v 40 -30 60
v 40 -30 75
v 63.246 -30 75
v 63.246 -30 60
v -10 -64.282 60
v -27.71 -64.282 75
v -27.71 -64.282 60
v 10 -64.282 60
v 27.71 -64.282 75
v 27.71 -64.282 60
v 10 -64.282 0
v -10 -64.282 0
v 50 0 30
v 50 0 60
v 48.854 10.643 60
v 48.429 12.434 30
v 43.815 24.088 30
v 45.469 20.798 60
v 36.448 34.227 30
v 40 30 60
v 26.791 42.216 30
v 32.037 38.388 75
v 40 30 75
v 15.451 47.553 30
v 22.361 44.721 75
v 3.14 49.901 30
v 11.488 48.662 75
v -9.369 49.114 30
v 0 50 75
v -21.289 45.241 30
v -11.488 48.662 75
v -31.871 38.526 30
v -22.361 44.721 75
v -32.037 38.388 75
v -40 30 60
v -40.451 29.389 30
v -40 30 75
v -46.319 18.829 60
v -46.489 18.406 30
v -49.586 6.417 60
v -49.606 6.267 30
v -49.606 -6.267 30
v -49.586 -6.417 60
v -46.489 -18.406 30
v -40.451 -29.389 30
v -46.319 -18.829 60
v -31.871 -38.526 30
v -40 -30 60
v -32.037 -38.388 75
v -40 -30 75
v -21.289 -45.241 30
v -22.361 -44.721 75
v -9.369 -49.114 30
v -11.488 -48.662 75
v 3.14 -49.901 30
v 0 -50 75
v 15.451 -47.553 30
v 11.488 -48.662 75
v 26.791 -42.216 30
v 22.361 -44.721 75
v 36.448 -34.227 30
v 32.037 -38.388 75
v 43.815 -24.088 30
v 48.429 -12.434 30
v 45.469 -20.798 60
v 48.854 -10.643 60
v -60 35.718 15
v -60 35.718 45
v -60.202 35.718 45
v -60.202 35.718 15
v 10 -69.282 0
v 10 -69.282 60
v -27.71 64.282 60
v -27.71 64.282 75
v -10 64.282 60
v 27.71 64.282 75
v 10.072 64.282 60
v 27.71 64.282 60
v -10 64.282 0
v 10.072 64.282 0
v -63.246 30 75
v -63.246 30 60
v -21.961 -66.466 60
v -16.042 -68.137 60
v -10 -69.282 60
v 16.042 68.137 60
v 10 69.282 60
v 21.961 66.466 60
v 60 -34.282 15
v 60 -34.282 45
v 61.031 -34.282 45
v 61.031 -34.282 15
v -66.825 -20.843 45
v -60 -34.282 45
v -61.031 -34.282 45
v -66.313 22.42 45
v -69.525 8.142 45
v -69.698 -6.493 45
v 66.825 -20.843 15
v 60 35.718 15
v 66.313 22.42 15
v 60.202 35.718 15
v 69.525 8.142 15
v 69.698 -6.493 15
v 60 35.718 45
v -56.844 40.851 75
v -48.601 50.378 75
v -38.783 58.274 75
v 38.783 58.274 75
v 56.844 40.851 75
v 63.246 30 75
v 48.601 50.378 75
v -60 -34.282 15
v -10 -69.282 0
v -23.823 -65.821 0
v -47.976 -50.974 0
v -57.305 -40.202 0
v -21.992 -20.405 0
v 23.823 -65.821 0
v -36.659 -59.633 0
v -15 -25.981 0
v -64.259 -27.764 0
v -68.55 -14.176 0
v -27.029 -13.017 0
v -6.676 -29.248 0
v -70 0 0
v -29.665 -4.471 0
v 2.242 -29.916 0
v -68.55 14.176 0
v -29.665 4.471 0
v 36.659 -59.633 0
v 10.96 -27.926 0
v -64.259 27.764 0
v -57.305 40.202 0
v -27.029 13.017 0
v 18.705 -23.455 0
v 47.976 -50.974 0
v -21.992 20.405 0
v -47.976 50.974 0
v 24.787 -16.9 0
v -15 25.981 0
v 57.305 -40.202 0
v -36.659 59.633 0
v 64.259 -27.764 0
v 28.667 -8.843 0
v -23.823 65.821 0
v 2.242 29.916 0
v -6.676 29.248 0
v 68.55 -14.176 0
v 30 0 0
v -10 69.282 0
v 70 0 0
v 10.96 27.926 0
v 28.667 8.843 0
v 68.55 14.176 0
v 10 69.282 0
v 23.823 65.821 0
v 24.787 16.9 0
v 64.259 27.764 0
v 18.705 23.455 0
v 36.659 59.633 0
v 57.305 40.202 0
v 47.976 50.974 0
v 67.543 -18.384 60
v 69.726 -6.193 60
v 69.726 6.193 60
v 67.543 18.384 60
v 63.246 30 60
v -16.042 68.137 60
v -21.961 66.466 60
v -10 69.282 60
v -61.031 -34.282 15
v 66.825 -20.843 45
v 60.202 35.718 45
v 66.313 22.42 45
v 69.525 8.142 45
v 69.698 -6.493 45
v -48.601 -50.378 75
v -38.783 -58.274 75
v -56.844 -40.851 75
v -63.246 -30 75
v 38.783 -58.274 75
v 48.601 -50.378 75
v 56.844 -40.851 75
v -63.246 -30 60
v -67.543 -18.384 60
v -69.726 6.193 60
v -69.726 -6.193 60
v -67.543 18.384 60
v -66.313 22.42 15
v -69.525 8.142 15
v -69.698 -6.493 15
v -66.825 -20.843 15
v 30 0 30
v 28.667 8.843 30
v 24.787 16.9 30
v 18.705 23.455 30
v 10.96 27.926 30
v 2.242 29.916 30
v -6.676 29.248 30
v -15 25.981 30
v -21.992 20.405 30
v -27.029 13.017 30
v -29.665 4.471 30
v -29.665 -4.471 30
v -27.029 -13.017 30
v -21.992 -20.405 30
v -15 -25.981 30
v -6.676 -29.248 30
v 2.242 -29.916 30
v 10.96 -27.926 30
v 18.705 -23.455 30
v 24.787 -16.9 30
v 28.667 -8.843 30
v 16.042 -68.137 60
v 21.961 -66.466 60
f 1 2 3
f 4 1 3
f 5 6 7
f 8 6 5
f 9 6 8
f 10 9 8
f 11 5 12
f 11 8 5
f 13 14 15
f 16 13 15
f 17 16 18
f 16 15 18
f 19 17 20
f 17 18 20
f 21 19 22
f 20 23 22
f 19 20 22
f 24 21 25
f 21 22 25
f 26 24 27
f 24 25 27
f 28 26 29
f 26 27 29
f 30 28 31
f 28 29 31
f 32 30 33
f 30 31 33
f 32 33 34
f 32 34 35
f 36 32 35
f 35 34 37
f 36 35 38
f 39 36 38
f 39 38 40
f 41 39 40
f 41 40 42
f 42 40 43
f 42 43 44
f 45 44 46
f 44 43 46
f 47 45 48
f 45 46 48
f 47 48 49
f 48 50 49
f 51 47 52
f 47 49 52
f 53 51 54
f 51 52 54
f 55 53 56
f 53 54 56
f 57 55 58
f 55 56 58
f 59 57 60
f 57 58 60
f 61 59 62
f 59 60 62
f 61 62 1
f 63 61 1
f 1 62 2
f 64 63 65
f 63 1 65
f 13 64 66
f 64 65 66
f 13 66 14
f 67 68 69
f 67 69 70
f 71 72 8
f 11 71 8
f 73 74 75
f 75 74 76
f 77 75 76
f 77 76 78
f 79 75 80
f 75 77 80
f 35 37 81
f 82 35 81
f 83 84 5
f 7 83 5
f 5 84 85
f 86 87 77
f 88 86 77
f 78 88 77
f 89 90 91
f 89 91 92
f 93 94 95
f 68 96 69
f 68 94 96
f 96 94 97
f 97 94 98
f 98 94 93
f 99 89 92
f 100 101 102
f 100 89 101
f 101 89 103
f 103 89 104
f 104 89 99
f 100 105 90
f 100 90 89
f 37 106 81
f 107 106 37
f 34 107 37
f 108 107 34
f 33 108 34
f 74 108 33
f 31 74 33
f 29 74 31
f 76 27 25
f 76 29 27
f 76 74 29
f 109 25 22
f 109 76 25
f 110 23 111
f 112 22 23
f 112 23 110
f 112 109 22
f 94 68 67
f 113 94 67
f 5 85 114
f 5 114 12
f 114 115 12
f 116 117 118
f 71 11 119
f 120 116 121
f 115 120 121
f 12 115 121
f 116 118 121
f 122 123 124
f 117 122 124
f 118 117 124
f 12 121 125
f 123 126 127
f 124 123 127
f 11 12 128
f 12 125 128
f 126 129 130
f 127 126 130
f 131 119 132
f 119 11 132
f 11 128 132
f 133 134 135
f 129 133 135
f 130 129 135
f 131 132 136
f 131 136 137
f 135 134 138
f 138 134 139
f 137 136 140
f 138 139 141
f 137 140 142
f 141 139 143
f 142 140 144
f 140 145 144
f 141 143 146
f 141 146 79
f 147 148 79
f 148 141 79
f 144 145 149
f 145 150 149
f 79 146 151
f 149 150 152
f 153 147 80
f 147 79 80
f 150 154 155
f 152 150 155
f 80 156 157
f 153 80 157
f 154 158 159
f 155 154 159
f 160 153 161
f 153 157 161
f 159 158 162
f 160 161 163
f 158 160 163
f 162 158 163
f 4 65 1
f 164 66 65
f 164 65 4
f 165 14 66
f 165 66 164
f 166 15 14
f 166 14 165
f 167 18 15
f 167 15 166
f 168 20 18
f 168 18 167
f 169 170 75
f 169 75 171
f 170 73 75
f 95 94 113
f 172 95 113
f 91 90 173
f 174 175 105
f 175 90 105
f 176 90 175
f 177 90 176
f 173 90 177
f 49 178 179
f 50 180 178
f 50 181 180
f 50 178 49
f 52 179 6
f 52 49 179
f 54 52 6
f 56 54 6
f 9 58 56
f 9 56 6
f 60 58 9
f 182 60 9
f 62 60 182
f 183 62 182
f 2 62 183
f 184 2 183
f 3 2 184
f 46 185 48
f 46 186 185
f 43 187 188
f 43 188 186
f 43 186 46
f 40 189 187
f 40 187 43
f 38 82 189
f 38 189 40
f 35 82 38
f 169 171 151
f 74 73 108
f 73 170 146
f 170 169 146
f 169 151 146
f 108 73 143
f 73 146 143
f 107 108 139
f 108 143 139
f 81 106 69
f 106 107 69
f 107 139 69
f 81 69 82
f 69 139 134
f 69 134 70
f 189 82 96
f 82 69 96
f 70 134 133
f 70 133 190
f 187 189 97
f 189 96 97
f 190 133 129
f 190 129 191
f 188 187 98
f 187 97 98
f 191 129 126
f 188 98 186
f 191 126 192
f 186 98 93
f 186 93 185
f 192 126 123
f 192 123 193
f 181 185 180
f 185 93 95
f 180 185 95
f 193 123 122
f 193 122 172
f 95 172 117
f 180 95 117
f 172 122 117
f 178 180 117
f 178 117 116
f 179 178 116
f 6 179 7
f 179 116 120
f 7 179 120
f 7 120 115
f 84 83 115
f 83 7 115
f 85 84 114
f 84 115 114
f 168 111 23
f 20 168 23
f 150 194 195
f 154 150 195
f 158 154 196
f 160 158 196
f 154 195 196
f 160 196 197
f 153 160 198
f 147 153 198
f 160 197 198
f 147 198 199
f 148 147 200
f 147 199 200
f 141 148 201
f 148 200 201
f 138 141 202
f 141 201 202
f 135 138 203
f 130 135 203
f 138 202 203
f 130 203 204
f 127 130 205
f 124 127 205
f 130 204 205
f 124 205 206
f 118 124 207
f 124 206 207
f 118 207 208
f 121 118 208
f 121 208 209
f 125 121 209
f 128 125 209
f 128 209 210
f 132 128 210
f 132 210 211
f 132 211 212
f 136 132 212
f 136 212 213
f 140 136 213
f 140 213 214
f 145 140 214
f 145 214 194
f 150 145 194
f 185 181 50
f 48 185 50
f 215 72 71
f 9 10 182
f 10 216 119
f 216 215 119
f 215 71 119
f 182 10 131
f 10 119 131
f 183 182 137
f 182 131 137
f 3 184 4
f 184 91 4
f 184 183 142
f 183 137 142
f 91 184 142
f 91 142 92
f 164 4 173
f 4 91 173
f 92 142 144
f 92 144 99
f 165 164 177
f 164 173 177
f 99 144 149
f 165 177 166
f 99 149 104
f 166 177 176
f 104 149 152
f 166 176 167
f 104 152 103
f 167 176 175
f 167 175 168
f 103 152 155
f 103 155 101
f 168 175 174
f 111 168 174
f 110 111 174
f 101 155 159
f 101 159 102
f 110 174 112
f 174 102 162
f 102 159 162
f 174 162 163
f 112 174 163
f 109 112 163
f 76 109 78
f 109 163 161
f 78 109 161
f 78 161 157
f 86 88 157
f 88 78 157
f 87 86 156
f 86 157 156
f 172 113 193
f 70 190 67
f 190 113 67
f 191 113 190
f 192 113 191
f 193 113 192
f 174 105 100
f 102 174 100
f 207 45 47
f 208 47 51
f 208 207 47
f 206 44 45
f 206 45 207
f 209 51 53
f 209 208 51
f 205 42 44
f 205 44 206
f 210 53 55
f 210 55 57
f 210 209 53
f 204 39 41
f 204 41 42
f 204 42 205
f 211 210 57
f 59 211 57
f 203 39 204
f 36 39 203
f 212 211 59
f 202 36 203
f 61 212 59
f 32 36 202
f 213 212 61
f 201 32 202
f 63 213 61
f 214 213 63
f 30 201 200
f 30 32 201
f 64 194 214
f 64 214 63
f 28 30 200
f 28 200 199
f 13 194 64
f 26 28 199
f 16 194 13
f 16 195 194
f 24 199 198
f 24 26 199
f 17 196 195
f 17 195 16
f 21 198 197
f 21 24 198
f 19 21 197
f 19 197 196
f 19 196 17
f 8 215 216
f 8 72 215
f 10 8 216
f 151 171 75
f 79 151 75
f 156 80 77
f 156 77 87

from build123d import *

# Parameters (mm, degrees)
SKETCH1_R           = 70
BOSS_EXTRUDE1_DEPTH = 75
SKETCH2_R           = 30
CUT_EXTRUDE1_DEPTH  = 75
CUT_EXTRUDE2_DEPTH  = 75
CUT_EXTRUDE3_DEPTH  = 75
SKETCH5_W           = 30
SKETCH5_H           = 70
CUT_EXTRUDE5_DEPTH  = 75
SKETCH6_W           = 30
SKETCH6_H           = 70
CUT_EXTRUDE6_DEPTH  = 75
SKETCH7_W           = 50
SKETCH7_H           = 15
CUT_EXTRUDE11_DEPTH = 5
CUT_EXTRUDE12_DEPTH = 88
SKETCH12_W          = 15
SKETCH12_H          = 1.10145185
CUT_EXTRUDE14_DEPTH = 88
SKETCH13_W          = 15
SKETCH13_H          = 1.10145185
CUT_EXTRUDE15_DEPTH = 88
SKETCH14_W          = 50
SKETCH14_H          = 15
CUT_EXTRUDE16_DEPTH = 5
SKETCH15_W          = 20
SKETCH15_H          = 5
CUT_EXTRUDE17_DEPTH = 73
SKETCH16_W          = 15
SKETCH16_H          = 1.10145185
CUT_EXTRUDE18_DEPTH = 73
SKETCH17_W          = 15
SKETCH17_H          = 1.10145185
CUT_EXTRUDE19_DEPTH = 73
CUT_EXTRUDE20_DEPTH = 15
SKETCH20_R          = 50
CUT_EXTRUDE21_DEPTH = 45


with BuildPart() as part:
    # Sketch1 → Boss-Extrude1 (new body)
    with BuildSketch(Plane.XY):
        Circle(SKETCH1_R)
    extrude(amount=BOSS_EXTRUDE1_DEPTH)

    # Sketch2 → Cut-Extrude1 (cut)
    with BuildSketch(Plane.XY.offset(75)):
        Circle(SKETCH2_R)
    extrude(amount=-CUT_EXTRUDE1_DEPTH, mode=Mode.SUBTRACT)

    # Sketch3 → Cut-Extrude2 (cut)
    with BuildSketch(Plane.XY.offset(75)):
        with BuildLine():
            Line((-10, 69.282032303), (10, 69.282032303))
            ThreePointArc((10, 69.282032303), (0, 70), (-10, 69.282032303))
        make_face()
    extrude(amount=-CUT_EXTRUDE2_DEPTH, mode=Mode.SUBTRACT)

    # Sketch4 → Cut-Extrude3 (cut)
    with BuildSketch(Plane.XY.offset(75)):
        with BuildLine():
            ThreePointArc((-10, -69.282032303), (0, -70), (10, -69.282032303))
            Line((10, -69.282032303), (-10, -69.282032303))
        make_face()
    extrude(amount=-CUT_EXTRUDE3_DEPTH, mode=Mode.SUBTRACT)

    # Sketch5 → Cut-Extrude5 (cut)
    with BuildSketch(Plane(origin=(-60, 0, 0), x_dir=(0, 0, -1), z_dir=(1, 0, 0))):
        with Locations((-30, 0.717967697)):
            Rectangle(SKETCH5_W, SKETCH5_H)
    extrude(amount=-CUT_EXTRUDE5_DEPTH, mode=Mode.SUBTRACT)

    # Sketch6 → Cut-Extrude6 (cut)
    with BuildSketch(Plane(origin=(60, 0, 0), x_dir=(0, 0, -1), z_dir=(1, 0, 0))):
        with Locations((-30, 0.717967697)):
            Rectangle(SKETCH6_W, SKETCH6_H)
    extrude(amount=CUT_EXTRUDE6_DEPTH, mode=Mode.SUBTRACT)

    # Sketch7 → Cut-Extrude11 (cut)
    with BuildSketch(Plane(origin=(0, 69.282032303, 0), x_dir=(1, 0, 0), z_dir=(0, 1, 0))):
        with Locations((0, -67.5)):
            Rectangle(SKETCH7_W, SKETCH7_H)
    extrude(amount=-CUT_EXTRUDE11_DEPTH, mode=Mode.SUBTRACT)

    # Sketch10 → Cut-Extrude12 (cut)
    with BuildSketch(Plane.XY.offset(60)):
        Polygon((-10, 69.282032303), (-10, 64.282032303), (10.07167941, 64.282032303), (10, 69.282032303), align=None)
    extrude(amount=-CUT_EXTRUDE12_DEPTH, mode=Mode.SUBTRACT)

    # Sketch12 → Cut-Extrude14 (cut)
    with BuildSketch(Plane(origin=(-25, 0, 0), x_dir=(0, 0, -1), z_dir=(1, 0, 0))):
        with Locations((-67.5, 64.832758228)):
            Rectangle(SKETCH12_W, SKETCH12_H)
    extrude(amount=-CUT_EXTRUDE14_DEPTH, mode=Mode.SUBTRACT)

    # Sketch13 → Cut-Extrude15 (cut)
    with BuildSketch(Plane.ZY.offset(-25)):
        with Locations((67.5, 64.832758228)):
            Rectangle(SKETCH13_W, SKETCH13_H)
    extrude(amount=-CUT_EXTRUDE15_DEPTH, mode=Mode.SUBTRACT)

    # Sketch14 → Cut-Extrude16 (cut)
    with BuildSketch(Plane.XZ.offset(69.282032303)):
        with Locations((0, 67.5)):
            Rectangle(SKETCH14_W, SKETCH14_H)
    extrude(amount=-CUT_EXTRUDE16_DEPTH, mode=Mode.SUBTRACT)

    # Sketch15 → Cut-Extrude17 (cut)
    with BuildSketch(Plane.XY.offset(60)):
        with Locations((0, -66.782032303)):
            Rectangle(SKETCH15_W, SKETCH15_H)
    extrude(amount=-CUT_EXTRUDE17_DEPTH, mode=Mode.SUBTRACT)

    # Sketch16 → Cut-Extrude18 (cut)
    with BuildSketch(Plane.ZY.offset(-25)):
        with Locations((67.5, -64.832758228)):
            Rectangle(SKETCH16_W, SKETCH16_H)
    extrude(amount=-CUT_EXTRUDE18_DEPTH, mode=Mode.SUBTRACT)

    # Sketch17 → Cut-Extrude19 (cut)
    with BuildSketch(Plane(origin=(-25, 0, 0), x_dir=(0, 0, -1), z_dir=(1, 0, 0))):
        with Locations((-67.5, -64.832758228)):
            Rectangle(SKETCH17_W, SKETCH17_H)
    extrude(amount=-CUT_EXTRUDE19_DEPTH, mode=Mode.SUBTRACT)

    # Sketch18 → Cut-Extrude20 (cut)
    with BuildSketch(Plane.XY.offset(75)):
        with BuildLine():
            ThreePointArc((0, -30), (-30, 0), (0, 30))
            Line((0, 30), (-63.245553203, 30))
            ThreePointArc((-63.245553203, 30), (-70, 0), (-63.245553203, -30))
            Line((-63.245553203, -30), (0, -30))
        make_face()
        with BuildLine():
            Line((63.245553203, 30), (0, 30))
            ThreePointArc((0, 30), (21.213203436, 21.213203436), (30, 0))
            ThreePointArc((30, 0), (21.213203436, -21.213203436), (0, -30))
            Line((0, -30), (63.245553203, -30))
            ThreePointArc((63.245553203, -30), (70, 0), (63.245553203, 30))
        make_face()
    extrude(amount=-CUT_EXTRUDE20_DEPTH, mode=Mode.SUBTRACT)

    # Sketch20 → Cut-Extrude21 (cut)
    with BuildSketch(Plane.XY.offset(75)):
        Circle(SKETCH20_R)
    extrude(amount=-CUT_EXTRUDE21_DEPTH, mode=Mode.SUBTRACT)


solid = part.part
